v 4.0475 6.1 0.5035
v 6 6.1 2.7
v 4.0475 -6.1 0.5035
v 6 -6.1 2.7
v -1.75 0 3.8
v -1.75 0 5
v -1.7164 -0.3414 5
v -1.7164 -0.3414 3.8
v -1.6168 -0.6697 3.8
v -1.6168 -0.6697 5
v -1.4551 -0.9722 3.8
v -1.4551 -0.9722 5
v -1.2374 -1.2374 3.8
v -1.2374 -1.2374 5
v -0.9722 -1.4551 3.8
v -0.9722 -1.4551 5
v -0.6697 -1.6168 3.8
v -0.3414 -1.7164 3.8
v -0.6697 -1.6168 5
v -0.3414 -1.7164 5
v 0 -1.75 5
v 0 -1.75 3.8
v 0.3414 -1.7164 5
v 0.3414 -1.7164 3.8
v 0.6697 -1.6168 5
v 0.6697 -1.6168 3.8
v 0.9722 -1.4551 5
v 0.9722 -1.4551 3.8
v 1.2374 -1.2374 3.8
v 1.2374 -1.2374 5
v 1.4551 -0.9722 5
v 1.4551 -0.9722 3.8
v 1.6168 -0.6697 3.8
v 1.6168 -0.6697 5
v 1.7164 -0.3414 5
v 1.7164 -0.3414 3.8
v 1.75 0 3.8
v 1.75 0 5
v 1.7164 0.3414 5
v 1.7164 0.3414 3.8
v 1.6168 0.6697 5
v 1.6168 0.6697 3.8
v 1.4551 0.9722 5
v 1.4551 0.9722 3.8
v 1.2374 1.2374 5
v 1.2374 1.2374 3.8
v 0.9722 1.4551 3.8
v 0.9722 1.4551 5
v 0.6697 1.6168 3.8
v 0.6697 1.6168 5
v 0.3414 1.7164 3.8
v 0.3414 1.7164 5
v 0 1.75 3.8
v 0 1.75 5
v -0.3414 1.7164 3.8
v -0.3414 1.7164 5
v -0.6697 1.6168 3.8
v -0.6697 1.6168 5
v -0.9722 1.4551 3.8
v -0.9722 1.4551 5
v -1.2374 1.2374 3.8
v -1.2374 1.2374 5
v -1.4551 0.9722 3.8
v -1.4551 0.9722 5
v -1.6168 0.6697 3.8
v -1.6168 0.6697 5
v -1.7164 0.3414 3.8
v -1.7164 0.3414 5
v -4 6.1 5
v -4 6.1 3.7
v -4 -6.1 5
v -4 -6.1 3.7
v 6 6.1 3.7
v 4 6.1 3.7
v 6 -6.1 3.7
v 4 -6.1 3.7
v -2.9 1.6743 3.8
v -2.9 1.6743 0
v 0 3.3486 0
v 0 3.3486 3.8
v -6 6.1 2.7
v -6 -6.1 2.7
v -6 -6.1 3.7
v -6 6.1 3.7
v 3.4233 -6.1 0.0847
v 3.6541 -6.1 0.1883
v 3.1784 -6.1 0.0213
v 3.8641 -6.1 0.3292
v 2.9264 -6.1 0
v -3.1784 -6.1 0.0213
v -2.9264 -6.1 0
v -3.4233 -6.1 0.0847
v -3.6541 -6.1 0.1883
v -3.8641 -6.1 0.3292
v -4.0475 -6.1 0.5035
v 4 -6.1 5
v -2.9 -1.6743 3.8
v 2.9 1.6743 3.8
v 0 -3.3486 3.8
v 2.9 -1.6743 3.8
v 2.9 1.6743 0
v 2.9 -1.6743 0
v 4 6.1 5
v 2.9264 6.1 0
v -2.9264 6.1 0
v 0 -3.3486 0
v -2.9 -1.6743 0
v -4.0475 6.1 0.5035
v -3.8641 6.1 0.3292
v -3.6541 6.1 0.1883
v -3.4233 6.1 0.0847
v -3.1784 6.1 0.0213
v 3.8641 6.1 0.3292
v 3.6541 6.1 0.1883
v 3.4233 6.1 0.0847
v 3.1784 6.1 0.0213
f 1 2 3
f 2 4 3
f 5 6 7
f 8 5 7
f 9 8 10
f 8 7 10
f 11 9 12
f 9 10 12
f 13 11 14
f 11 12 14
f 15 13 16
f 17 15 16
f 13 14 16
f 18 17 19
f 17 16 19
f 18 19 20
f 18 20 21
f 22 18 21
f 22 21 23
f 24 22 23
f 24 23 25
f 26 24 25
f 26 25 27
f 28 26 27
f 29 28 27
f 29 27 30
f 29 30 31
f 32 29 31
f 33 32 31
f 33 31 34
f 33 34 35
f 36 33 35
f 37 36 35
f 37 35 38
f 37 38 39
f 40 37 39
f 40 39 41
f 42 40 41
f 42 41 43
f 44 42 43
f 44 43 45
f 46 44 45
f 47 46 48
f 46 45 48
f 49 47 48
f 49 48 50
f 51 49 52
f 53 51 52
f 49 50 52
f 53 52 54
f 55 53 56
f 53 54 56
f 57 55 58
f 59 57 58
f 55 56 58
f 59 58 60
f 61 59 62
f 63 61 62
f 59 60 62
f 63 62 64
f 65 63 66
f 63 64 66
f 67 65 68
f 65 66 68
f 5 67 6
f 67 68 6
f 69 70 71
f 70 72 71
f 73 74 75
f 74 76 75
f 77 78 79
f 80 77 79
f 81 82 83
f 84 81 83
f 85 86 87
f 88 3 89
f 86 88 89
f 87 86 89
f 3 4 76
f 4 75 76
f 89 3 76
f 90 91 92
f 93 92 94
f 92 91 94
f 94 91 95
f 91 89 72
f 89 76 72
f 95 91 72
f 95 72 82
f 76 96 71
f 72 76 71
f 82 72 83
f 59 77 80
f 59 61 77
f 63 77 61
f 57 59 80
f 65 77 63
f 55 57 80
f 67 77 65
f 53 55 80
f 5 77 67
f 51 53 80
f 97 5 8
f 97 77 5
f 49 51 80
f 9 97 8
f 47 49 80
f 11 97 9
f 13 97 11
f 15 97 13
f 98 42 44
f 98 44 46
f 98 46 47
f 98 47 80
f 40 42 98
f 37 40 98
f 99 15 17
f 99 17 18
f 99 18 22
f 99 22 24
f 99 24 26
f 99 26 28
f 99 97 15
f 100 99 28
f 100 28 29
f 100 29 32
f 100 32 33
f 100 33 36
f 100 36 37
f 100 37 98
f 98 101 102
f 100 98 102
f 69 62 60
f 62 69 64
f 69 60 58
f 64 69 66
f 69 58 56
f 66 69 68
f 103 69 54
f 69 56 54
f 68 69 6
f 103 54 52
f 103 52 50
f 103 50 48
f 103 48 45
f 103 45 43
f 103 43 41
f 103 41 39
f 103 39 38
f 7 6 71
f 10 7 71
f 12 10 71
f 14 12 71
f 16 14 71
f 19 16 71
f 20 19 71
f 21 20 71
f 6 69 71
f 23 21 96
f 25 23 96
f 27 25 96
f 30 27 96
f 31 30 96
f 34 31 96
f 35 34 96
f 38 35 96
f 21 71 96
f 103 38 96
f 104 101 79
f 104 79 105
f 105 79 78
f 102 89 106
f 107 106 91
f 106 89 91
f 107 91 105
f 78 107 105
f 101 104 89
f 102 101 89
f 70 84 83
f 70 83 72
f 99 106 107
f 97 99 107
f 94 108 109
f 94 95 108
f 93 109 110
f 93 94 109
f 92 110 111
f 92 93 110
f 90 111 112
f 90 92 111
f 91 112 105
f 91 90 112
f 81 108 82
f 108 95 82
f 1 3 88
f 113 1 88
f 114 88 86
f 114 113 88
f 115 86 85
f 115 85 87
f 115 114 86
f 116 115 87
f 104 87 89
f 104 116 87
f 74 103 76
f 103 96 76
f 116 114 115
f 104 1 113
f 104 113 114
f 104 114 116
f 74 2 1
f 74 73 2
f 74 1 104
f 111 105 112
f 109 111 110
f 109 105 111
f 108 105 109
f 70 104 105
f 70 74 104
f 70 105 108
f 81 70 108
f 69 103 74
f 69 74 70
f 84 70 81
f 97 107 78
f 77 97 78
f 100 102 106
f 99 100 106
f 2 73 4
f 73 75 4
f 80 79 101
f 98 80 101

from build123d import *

# Parameters (mm, degrees)
PAD_DEPTH       = 6.1
SKETCH001_R     = 1.75
POCKET_DEPTH    = 5.001
POCKET001_DEPTH = 3.8
FILLET_R        = 1.5


with BuildPart() as part:
    # Sketch → Pad (new body, symmetric)
    with BuildSketch(Plane.XZ):
        Polygon((-6, 3.7), (-4, 3.7), (-4, 5), (4, 5), (4, 3.7), (6, 3.7), (6, 2.7), (3.6, 0), (-3.6, 0), (-6, 2.7), align=None)
    extrude(amount=PAD_DEPTH, both=True)

    # Sketch001 (on Face4 of Pad) → Pocket (cut, through all)
    with BuildSketch(Plane(origin=(0, 0, 5), x_dir=(-1, 0, 0), z_dir=(0, 0, 1))):
        Circle(SKETCH001_R)
    extrude(amount=-POCKET_DEPTH, mode=Mode.SUBTRACT)

    # Sketch002 (on Face7 of Pocket) → Pocket001 (cut)
    with BuildSketch(Plane(origin=(0, 0, 0), x_dir=(1, 0, 0), z_dir=(0, 0, -1))):
        Polygon((2.9, 1.674316), (0, 3.348632), (-2.9, 1.674316), (-2.9, -1.674316), (0, -3.348632), (2.9, -1.674316), align=None)
    extrude(amount=-POCKET001_DEPTH, mode=Mode.SUBTRACT)

    # Fillet
    fillet_edges = [part.edges().sort_by_distance(p)[0] for p in [
        (3.6, 0, 0),
        (-3.6, 0, 0),
    ]]
    fillet(fillet_edges, radius=FILLET_R)


solid = part.part
